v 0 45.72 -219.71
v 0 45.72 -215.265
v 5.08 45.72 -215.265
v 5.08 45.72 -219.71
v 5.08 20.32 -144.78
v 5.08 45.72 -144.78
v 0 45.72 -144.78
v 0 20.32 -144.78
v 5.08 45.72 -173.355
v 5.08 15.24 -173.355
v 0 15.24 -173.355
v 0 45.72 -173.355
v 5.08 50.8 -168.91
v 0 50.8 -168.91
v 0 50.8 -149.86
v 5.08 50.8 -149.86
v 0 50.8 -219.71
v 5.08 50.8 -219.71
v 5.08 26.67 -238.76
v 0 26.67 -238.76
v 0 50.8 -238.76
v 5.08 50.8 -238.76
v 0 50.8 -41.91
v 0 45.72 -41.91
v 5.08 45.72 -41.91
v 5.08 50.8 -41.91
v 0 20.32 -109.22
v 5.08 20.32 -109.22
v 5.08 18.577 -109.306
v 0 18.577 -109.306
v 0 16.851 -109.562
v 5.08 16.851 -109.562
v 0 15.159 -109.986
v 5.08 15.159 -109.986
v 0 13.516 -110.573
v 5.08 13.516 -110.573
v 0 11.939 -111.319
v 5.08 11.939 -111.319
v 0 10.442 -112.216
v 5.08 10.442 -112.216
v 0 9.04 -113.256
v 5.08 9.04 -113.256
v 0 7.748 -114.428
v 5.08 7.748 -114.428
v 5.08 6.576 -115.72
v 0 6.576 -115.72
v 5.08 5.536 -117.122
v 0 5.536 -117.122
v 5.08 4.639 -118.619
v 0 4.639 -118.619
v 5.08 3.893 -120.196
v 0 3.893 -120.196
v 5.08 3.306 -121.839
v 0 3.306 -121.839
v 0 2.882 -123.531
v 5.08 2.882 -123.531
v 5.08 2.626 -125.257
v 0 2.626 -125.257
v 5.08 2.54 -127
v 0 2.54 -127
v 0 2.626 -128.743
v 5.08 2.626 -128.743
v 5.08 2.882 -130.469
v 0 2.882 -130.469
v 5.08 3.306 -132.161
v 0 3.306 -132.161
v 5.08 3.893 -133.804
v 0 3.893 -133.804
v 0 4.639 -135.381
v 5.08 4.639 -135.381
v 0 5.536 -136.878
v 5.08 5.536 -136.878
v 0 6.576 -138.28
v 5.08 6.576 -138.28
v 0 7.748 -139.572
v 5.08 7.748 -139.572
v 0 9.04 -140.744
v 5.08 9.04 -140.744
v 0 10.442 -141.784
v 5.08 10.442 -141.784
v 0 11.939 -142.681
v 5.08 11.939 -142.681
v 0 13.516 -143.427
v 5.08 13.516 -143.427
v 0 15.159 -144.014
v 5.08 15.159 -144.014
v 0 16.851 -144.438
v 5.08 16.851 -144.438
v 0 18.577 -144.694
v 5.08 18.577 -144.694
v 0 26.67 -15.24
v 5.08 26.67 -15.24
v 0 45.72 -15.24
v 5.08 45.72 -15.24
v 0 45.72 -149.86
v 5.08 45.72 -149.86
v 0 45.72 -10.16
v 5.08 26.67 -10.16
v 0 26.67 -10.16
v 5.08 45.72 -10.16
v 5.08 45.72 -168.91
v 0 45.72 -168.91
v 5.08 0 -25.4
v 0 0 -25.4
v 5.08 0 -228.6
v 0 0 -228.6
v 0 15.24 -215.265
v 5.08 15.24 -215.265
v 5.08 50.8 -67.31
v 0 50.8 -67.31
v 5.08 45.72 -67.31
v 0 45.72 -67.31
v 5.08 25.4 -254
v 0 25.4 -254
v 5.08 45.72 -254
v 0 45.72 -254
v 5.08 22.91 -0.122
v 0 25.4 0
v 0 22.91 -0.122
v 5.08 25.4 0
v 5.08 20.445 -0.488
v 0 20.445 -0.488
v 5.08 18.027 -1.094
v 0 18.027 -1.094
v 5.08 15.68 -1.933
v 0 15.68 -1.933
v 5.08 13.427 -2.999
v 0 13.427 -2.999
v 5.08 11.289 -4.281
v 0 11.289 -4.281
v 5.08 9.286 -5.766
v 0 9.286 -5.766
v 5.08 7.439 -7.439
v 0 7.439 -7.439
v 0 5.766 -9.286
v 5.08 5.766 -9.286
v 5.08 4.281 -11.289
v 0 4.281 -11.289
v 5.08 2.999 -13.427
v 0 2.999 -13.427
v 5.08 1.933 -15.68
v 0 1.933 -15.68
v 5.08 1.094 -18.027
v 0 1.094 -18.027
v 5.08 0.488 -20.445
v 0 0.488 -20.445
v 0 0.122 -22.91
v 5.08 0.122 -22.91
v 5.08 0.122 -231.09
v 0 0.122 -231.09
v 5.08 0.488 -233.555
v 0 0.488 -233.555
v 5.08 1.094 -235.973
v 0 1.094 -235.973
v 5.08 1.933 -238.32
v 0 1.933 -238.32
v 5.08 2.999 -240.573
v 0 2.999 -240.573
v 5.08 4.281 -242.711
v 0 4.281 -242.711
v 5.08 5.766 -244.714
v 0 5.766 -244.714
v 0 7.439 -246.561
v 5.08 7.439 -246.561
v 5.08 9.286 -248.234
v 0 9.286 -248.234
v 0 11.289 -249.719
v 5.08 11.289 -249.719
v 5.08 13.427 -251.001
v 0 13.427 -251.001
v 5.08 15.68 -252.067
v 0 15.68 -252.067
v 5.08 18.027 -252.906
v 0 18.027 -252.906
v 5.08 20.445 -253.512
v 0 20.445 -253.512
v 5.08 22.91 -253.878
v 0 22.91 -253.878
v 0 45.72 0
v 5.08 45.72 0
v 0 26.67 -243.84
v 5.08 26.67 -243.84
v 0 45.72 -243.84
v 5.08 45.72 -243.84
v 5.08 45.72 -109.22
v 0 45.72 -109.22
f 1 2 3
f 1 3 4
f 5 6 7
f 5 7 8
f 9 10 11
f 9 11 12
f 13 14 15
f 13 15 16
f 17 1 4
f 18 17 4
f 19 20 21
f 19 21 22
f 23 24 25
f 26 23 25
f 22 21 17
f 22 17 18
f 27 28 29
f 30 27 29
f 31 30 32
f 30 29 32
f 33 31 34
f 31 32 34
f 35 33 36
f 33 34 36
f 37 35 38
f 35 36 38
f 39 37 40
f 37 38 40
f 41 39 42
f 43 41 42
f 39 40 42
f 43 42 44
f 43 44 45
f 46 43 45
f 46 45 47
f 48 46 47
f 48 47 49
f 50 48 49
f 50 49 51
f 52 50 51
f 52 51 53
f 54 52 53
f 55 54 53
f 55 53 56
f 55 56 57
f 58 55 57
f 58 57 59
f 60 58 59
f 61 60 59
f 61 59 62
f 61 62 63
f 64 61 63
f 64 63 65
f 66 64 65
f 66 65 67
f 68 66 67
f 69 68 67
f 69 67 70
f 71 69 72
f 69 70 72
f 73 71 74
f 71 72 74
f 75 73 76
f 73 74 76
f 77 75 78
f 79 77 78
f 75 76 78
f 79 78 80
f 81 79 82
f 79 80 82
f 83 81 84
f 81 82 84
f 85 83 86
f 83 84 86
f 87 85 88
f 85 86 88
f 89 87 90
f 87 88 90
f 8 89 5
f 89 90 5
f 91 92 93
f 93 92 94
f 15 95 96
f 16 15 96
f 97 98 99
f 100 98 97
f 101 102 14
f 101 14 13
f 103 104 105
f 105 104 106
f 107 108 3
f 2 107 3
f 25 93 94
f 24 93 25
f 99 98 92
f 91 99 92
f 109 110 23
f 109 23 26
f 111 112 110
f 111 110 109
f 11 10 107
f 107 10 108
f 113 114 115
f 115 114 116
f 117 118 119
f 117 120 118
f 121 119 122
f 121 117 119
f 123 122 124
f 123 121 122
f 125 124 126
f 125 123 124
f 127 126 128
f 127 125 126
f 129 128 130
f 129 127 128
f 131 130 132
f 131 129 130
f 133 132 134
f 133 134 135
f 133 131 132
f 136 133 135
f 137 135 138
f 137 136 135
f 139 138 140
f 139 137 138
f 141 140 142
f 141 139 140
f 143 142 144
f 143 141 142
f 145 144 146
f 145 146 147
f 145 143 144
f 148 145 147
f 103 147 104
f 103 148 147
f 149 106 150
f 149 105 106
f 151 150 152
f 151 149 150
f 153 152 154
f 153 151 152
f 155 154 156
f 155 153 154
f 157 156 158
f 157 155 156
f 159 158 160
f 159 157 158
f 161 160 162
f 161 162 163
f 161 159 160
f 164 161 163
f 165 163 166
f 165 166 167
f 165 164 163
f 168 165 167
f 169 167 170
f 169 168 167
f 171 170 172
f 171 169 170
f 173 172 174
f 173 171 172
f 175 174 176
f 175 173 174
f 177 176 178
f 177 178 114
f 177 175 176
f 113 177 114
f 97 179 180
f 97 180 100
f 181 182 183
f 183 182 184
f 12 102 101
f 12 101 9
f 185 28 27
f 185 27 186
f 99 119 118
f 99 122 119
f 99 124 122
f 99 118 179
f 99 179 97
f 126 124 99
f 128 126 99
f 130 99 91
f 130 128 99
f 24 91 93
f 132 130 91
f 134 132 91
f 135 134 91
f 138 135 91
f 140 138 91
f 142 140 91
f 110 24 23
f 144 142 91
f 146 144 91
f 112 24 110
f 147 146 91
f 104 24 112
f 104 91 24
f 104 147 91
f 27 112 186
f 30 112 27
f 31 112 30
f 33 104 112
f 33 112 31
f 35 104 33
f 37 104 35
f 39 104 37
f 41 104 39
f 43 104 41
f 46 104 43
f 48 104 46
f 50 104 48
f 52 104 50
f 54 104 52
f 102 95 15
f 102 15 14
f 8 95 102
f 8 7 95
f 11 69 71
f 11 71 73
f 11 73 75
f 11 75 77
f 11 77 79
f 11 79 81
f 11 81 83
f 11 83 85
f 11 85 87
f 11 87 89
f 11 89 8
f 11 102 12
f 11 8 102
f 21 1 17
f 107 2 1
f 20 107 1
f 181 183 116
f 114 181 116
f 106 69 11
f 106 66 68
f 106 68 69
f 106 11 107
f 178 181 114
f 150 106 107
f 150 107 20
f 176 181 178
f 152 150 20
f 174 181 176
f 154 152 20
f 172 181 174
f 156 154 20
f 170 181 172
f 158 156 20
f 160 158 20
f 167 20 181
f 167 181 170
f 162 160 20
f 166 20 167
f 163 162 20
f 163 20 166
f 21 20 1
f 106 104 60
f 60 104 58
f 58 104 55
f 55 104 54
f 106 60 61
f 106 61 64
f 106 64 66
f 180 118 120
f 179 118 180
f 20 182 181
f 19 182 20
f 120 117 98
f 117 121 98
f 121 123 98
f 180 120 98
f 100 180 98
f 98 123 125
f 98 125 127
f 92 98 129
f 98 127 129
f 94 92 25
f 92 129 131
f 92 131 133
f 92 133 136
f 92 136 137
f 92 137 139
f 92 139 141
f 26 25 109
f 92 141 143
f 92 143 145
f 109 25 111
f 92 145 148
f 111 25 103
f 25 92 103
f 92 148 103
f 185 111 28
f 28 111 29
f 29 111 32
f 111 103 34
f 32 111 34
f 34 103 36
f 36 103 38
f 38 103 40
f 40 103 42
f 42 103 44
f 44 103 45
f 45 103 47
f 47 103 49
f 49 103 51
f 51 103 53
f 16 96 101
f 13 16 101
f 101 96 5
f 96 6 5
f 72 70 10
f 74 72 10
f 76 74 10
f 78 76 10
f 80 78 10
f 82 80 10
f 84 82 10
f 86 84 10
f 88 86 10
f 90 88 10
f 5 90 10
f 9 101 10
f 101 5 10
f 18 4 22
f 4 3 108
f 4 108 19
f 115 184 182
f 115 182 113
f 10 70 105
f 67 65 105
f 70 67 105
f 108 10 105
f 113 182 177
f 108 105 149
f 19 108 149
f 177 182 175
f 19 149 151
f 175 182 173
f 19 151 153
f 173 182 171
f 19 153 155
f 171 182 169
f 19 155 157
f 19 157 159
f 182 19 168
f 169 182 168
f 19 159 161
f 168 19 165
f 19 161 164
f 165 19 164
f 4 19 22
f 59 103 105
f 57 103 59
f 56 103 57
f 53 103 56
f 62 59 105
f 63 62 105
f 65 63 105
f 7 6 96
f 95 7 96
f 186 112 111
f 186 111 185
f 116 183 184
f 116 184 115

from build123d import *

# Parameters (mm, degrees)
SKETCH1_W           = 254
SKETCH1_H           = 45.72
BOSS_EXTRUDE1_DEPTH = 5.08
SKETCH2_R           = 17.78
CUT_EXTRUDE2_DEPTH  = 259.131991043
CUT_EXTRUDE3_DEPTH  = 259.131991043
FILLET1_R           = 25.4
SKETCH5_W           = 5.08
SKETCH5_H           = 25.4
BOSS_EXTRUDE2_DEPTH = 5.08
SKETCH7_W           = 5.08
SKETCH7_H           = 19.05
CUT_EXTRUDE4_DEPTH  = 31.75
SKETCH9_W           = 5.08
SKETCH9_H           = 19.05
BOSS_EXTRUDE3_DEPTH = 5.08
SKETCH10_W          = 41.91
SKETCH10_H          = 30.48
CUT_EXTRUDE6_DEPTH  = 260.08


with BuildPart() as part:
    # Sketch1 → Boss-Extrude1 (new body)
    with BuildSketch(Plane(origin=(0, 0, 0), x_dir=(0, 0, -1), z_dir=(1, 0, 0))):
        with Locations((127, 22.86)):
            Rectangle(SKETCH1_W, SKETCH1_H)
    extrude(amount=BOSS_EXTRUDE1_DEPTH)

    # Sketch2 → Cut-Extrude2 (cut, through all)
    with BuildSketch(Plane(origin=(5.08, 0, 0), x_dir=(0, 0, -1), z_dir=(1, 0, 0))):
        with Locations((127, 20.32)):
            Circle(SKETCH2_R)
    extrude(amount=-CUT_EXTRUDE2_DEPTH, mode=Mode.SUBTRACT)

    # Sketch4 → Cut-Extrude3 (cut, through all)
    with BuildSketch(Plane(origin=(5.08, 0, 0), x_dir=(0, 0, -1), z_dir=(1, 0, 0))):
        Polygon((109.22, 20.32), (109.22, 45.72), (127, 45.72), (144.78, 45.72), (144.78, 20.32), align=None)
    extrude(amount=-CUT_EXTRUDE3_DEPTH, mode=Mode.SUBTRACT)

    # Fillet1
    fillet1_edges = [part.edges().sort_by_distance(p)[0] for p in [
        (2.54, 0, -254),
        (2.54, 0, 0),
    ]]
    fillet(fillet1_edges, radius=FILLET1_R)

    # Sketch5 → Boss-Extrude2 (add)
    with BuildSketch(Plane(origin=(0, 45.72, 0), x_dir=(1, 0, 0), z_dir=(0, 1, 0))):
        with Locations((2.54, 54.61)):
            Rectangle(SKETCH5_W, SKETCH5_H)
    extrude(amount=BOSS_EXTRUDE2_DEPTH)

    # Sketch7 → Cut-Extrude4 (cut)
    with BuildSketch(Plane(origin=(5.08, 0, 0), x_dir=(0, 0, -1), z_dir=(1, 0, 0))):
        with Locations((12.7, 36.195)):
            Rectangle(SKETCH7_W, SKETCH7_H)
    cut_extrude4 = extrude(amount=-CUT_EXTRUDE4_DEPTH, mode=Mode.SUBTRACT)

    # Mirror1: Cut-Extrude4 across plane
    add(cut_extrude4.mirror(Plane.XY.offset(-127)), mode=Mode.SUBTRACT)

    # Sketch9 → Boss-Extrude3 (add)
    with BuildSketch(Plane(origin=(0, 45.72, 0), x_dir=(1, 0, 0), z_dir=(0, 1, 0))):
        with Locations((2.54, 229.235)):
            Rectangle(SKETCH9_W, SKETCH9_H)
        with Locations((2.54, 159.385)):
            Rectangle(SKETCH9_W, SKETCH9_H)
    extrude(amount=BOSS_EXTRUDE3_DEPTH)

    # Sketch10 → Cut-Extrude6 (cut, through all)
    with BuildSketch(Plane(origin=(5.08, 0, 0), x_dir=(0, 0, -1), z_dir=(1, 0, 0))):
        with Locations((194.31, 30.48)):
            Rectangle(SKETCH10_W, SKETCH10_H)
    extrude(amount=-CUT_EXTRUDE6_DEPTH, mode=Mode.SUBTRACT)


solid = part.part
